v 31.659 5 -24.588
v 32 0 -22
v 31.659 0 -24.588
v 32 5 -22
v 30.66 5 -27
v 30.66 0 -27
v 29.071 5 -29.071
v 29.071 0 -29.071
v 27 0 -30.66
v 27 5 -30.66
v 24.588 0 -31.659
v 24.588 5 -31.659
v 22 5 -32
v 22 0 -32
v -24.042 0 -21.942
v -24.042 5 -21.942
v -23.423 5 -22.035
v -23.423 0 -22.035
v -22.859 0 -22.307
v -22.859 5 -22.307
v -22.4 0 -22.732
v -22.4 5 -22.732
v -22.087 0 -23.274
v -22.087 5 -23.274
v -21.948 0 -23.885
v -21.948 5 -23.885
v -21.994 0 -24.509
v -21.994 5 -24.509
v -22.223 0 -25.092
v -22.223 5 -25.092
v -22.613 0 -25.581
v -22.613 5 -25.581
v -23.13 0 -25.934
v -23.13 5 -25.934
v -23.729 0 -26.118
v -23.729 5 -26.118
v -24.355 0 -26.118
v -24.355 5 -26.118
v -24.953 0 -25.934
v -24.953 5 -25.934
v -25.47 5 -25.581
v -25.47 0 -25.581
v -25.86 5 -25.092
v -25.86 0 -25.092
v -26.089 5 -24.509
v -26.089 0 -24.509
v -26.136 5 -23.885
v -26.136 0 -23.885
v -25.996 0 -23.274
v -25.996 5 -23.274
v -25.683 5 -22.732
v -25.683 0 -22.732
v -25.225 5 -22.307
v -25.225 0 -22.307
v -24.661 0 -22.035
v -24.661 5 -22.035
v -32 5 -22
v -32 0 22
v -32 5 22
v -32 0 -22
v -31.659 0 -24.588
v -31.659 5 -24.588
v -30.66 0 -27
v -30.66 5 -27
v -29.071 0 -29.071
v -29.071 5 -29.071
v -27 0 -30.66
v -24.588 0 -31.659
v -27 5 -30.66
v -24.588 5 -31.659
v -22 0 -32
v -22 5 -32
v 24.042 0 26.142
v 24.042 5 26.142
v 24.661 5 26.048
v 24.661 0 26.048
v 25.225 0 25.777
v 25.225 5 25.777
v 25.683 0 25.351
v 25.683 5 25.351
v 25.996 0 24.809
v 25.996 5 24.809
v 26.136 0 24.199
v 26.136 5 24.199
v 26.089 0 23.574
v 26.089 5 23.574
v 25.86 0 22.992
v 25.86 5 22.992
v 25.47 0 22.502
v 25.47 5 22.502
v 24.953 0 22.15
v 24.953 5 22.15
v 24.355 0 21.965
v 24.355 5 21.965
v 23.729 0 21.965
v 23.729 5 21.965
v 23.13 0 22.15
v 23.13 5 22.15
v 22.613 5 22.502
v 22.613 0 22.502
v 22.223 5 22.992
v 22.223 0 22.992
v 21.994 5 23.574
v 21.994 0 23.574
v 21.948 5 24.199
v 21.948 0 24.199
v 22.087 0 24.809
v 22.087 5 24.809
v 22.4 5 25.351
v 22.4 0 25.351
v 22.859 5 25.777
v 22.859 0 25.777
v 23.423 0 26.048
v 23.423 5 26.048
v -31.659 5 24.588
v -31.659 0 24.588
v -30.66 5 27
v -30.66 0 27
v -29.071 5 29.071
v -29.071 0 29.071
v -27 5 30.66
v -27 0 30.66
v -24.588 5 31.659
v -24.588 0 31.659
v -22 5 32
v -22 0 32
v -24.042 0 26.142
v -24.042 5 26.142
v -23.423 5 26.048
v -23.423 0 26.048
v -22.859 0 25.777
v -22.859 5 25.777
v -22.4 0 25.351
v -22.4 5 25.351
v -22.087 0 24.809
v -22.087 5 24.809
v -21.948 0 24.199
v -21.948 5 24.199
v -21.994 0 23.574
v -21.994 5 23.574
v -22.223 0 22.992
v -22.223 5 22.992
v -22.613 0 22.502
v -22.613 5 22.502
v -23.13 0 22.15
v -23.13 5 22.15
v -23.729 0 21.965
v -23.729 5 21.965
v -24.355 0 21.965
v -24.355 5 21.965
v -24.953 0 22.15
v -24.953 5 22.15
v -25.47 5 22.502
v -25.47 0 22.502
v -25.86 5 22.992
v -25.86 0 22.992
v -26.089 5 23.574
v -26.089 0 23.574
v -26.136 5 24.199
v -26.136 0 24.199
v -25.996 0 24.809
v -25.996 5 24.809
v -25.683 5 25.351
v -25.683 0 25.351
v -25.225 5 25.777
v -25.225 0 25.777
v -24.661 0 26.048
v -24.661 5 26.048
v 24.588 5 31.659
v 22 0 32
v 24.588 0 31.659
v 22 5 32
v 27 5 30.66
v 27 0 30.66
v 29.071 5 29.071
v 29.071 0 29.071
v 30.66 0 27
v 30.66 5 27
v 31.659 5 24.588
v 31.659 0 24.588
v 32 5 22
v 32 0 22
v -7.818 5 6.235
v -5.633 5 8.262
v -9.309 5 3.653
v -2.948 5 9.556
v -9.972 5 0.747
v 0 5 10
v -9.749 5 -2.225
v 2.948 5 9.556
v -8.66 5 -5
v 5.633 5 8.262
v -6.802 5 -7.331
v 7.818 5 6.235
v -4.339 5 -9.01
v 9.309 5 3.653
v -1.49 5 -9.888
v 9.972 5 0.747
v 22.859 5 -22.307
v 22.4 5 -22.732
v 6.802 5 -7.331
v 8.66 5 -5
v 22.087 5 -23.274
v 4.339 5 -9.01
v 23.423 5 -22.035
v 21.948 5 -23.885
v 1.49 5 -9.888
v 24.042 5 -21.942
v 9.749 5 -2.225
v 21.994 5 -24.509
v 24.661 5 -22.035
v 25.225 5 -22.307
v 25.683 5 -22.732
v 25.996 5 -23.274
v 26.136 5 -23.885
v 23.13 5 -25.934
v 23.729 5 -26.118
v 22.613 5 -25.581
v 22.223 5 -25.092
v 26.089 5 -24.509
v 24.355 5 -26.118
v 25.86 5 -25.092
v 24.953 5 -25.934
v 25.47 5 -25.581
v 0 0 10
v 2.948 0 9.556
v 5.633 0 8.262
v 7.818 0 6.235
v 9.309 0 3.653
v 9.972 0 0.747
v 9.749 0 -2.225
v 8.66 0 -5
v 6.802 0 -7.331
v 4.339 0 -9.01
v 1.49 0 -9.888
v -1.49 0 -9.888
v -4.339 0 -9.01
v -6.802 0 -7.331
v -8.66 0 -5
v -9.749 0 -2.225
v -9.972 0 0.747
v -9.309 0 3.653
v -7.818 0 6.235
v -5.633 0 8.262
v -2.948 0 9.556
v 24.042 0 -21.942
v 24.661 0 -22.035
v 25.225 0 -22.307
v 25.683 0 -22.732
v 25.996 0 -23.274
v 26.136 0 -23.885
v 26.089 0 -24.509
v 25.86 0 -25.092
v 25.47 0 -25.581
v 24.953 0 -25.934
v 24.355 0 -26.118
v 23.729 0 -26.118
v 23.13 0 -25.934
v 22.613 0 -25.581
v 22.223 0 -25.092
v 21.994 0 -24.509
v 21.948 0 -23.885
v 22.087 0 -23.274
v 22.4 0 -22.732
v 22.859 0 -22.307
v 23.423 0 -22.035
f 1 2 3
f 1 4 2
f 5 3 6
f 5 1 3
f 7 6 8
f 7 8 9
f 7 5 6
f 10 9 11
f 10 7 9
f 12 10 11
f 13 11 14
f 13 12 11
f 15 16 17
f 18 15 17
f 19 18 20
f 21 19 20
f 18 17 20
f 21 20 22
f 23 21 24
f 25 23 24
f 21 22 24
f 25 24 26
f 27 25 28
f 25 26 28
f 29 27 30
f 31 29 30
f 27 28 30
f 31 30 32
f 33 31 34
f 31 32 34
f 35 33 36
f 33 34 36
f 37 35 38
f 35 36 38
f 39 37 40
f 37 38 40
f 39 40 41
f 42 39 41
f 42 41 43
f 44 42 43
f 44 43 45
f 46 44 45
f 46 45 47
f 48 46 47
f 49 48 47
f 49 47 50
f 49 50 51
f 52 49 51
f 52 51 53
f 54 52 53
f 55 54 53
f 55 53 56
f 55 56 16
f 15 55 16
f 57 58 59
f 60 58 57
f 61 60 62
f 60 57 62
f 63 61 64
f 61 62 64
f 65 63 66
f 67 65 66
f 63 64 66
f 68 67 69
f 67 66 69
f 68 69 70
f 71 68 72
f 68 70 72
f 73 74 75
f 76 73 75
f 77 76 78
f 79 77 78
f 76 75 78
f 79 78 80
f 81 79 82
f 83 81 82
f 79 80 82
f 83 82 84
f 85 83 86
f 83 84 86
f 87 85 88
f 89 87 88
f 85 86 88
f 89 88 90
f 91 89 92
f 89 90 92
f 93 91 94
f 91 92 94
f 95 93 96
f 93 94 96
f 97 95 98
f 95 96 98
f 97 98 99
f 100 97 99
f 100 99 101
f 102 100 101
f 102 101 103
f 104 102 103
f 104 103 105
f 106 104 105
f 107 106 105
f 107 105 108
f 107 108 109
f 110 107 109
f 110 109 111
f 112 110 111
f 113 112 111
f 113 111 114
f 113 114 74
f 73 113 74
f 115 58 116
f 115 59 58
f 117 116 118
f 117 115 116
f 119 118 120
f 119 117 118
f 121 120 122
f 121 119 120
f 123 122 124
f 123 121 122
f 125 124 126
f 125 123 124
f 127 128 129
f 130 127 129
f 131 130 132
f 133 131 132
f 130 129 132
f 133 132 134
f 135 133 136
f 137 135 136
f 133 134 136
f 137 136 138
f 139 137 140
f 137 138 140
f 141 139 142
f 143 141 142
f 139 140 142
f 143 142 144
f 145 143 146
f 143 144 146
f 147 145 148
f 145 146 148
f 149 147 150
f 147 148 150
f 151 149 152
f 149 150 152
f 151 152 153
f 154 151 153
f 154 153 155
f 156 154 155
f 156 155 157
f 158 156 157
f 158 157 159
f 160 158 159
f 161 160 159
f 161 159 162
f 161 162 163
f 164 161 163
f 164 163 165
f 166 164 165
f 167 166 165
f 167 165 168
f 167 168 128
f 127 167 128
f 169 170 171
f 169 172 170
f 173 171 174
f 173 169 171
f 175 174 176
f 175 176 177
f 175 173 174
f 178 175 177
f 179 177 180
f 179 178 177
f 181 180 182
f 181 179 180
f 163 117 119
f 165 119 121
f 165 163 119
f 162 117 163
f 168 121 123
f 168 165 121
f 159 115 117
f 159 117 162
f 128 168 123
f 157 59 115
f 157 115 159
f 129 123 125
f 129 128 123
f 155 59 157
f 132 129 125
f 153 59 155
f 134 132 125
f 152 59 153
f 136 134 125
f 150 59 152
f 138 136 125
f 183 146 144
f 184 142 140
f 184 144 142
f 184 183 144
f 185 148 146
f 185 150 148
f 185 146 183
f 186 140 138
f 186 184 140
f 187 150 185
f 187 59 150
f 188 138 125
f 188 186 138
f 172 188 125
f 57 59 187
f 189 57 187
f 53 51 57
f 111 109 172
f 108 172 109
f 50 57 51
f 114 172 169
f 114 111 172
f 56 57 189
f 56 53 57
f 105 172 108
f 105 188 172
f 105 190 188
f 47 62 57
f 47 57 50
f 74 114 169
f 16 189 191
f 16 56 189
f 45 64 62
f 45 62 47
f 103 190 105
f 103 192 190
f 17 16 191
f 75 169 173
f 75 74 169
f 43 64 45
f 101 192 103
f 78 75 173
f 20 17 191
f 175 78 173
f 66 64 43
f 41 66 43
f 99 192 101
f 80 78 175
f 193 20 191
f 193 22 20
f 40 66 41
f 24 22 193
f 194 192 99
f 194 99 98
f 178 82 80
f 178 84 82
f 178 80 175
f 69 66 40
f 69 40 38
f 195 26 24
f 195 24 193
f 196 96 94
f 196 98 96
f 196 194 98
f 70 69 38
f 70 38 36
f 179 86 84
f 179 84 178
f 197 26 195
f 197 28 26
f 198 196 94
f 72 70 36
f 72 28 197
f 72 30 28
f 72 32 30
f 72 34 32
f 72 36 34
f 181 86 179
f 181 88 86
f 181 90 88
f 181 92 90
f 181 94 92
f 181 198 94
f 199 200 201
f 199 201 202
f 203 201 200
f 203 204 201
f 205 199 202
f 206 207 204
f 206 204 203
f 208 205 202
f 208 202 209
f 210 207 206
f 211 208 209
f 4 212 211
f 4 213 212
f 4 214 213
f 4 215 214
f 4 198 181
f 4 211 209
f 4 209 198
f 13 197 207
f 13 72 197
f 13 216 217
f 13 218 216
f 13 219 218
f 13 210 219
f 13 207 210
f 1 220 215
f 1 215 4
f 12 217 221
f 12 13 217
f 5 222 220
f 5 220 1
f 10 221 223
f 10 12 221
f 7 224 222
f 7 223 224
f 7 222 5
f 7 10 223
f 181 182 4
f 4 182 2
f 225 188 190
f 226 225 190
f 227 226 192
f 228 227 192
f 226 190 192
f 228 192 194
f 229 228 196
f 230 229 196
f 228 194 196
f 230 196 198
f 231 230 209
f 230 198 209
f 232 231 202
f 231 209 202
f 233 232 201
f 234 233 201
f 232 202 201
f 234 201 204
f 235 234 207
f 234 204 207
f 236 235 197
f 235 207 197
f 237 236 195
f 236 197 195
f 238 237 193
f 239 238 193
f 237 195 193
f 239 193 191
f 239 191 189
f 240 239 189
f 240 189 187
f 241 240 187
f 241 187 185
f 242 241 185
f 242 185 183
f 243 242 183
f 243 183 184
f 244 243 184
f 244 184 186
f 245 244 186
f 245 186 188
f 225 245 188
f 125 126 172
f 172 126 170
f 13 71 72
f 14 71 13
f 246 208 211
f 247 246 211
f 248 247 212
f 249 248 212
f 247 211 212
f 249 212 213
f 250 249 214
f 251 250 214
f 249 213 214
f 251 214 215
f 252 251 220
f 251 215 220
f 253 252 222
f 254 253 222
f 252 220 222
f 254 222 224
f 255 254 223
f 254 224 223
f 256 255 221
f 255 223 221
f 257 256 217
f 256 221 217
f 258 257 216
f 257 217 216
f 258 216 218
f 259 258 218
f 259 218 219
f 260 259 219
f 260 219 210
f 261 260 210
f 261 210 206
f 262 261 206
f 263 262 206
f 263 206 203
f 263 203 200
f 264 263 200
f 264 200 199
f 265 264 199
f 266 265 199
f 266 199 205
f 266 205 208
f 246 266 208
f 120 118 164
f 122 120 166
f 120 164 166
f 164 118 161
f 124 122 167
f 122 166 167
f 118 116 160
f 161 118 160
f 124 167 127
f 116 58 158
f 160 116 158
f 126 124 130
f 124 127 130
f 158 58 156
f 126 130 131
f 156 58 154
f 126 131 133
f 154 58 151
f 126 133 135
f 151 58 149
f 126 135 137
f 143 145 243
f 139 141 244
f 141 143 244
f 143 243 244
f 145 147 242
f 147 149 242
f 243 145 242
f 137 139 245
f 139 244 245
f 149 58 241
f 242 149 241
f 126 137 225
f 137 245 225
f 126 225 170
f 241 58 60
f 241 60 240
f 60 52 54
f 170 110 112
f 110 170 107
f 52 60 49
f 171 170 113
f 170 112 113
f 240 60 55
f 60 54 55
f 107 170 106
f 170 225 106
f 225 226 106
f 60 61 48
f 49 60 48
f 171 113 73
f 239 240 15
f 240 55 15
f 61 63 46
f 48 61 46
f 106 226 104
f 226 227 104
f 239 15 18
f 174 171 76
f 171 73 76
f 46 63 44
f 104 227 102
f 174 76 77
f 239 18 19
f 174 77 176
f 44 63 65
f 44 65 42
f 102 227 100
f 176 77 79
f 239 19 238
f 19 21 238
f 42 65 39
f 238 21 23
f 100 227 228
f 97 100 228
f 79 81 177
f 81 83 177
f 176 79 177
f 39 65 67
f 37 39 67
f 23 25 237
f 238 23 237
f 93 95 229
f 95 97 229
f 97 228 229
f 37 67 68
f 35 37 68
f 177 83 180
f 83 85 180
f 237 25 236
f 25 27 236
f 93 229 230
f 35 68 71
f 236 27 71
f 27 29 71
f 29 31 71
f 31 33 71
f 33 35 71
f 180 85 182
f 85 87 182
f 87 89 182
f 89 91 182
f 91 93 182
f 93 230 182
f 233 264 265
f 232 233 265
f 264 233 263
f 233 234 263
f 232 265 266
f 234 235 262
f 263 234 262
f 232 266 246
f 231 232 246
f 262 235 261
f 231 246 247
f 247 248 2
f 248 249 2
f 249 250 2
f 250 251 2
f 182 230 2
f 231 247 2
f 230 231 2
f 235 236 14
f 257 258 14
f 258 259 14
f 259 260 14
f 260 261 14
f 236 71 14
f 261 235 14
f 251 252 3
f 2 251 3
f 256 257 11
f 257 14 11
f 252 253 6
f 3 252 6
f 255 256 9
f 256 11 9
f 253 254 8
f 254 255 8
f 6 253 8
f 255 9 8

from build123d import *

# Parameters (mm, degrees)
SKETCH_1_W          = 64
SKETCH_1_H          = 64
EXTRUDE_1_DEPTH     = 5
FILLET_1_R          = 10
SKETCH_3_R          = 2.1
CUT_EXTRUDE_2_DEPTH = 10
SKETCH_2_R          = 10
CUT_EXTRUDE_3_DEPTH = 20


with BuildPart() as part:
    # 草图1 → 凸台-拉伸1 (new body)
    with BuildSketch(Plane(origin=(0, 0, 0), x_dir=(1, 0, 0), z_dir=(0, 1, 0))):
        Rectangle(SKETCH_1_W, SKETCH_1_H)
    extrude(amount=EXTRUDE_1_DEPTH)

    # 圆角1
    fillet_1_edges = [part.edges().sort_by_distance(p)[0] for p in [
        (32, 2.5, 32),
        (-32, 2.5, 32),
        (-32, 2.5, -32),
        (32, 2.5, -32),
    ]]
    fillet(fillet_1_edges, radius=FILLET_1_R)

    # 草图3 → 切除-拉伸2 (cut)
    with BuildSketch(Plane(origin=(0, 5, 0), x_dir=(1, 0, 0), z_dir=(0, 1, 0))):
        with Locations(Location((24.04163056, 24.04163056, 0), (0, 0, 270))):
            Circle(SKETCH_3_R)
        with Locations(Location((24.04163056, -24.04163056, 0), (0, 0, 270))):
            Circle(SKETCH_3_R)
        with Locations(Location((-24.04163056, -24.04163056, 0), (0, 0, 270))):
            Circle(SKETCH_3_R)
        with Locations(Location((-24.04163056, 24.04163056, 0), (0, 0, 270))):
            Circle(SKETCH_3_R)
    extrude(amount=-CUT_EXTRUDE_2_DEPTH, mode=Mode.SUBTRACT)

    # 草图2 → 切除-拉伸3 (cut)
    with BuildSketch(Plane(origin=(0, 5, 0), x_dir=(1, 0, 0), z_dir=(0, 1, 0))):
        with Locations(Location((0, 0, 0), (0, 0, 270))):
            Circle(SKETCH_2_R)
    extrude(amount=-CUT_EXTRUDE_3_DEPTH, mode=Mode.SUBTRACT)


solid = part.part
